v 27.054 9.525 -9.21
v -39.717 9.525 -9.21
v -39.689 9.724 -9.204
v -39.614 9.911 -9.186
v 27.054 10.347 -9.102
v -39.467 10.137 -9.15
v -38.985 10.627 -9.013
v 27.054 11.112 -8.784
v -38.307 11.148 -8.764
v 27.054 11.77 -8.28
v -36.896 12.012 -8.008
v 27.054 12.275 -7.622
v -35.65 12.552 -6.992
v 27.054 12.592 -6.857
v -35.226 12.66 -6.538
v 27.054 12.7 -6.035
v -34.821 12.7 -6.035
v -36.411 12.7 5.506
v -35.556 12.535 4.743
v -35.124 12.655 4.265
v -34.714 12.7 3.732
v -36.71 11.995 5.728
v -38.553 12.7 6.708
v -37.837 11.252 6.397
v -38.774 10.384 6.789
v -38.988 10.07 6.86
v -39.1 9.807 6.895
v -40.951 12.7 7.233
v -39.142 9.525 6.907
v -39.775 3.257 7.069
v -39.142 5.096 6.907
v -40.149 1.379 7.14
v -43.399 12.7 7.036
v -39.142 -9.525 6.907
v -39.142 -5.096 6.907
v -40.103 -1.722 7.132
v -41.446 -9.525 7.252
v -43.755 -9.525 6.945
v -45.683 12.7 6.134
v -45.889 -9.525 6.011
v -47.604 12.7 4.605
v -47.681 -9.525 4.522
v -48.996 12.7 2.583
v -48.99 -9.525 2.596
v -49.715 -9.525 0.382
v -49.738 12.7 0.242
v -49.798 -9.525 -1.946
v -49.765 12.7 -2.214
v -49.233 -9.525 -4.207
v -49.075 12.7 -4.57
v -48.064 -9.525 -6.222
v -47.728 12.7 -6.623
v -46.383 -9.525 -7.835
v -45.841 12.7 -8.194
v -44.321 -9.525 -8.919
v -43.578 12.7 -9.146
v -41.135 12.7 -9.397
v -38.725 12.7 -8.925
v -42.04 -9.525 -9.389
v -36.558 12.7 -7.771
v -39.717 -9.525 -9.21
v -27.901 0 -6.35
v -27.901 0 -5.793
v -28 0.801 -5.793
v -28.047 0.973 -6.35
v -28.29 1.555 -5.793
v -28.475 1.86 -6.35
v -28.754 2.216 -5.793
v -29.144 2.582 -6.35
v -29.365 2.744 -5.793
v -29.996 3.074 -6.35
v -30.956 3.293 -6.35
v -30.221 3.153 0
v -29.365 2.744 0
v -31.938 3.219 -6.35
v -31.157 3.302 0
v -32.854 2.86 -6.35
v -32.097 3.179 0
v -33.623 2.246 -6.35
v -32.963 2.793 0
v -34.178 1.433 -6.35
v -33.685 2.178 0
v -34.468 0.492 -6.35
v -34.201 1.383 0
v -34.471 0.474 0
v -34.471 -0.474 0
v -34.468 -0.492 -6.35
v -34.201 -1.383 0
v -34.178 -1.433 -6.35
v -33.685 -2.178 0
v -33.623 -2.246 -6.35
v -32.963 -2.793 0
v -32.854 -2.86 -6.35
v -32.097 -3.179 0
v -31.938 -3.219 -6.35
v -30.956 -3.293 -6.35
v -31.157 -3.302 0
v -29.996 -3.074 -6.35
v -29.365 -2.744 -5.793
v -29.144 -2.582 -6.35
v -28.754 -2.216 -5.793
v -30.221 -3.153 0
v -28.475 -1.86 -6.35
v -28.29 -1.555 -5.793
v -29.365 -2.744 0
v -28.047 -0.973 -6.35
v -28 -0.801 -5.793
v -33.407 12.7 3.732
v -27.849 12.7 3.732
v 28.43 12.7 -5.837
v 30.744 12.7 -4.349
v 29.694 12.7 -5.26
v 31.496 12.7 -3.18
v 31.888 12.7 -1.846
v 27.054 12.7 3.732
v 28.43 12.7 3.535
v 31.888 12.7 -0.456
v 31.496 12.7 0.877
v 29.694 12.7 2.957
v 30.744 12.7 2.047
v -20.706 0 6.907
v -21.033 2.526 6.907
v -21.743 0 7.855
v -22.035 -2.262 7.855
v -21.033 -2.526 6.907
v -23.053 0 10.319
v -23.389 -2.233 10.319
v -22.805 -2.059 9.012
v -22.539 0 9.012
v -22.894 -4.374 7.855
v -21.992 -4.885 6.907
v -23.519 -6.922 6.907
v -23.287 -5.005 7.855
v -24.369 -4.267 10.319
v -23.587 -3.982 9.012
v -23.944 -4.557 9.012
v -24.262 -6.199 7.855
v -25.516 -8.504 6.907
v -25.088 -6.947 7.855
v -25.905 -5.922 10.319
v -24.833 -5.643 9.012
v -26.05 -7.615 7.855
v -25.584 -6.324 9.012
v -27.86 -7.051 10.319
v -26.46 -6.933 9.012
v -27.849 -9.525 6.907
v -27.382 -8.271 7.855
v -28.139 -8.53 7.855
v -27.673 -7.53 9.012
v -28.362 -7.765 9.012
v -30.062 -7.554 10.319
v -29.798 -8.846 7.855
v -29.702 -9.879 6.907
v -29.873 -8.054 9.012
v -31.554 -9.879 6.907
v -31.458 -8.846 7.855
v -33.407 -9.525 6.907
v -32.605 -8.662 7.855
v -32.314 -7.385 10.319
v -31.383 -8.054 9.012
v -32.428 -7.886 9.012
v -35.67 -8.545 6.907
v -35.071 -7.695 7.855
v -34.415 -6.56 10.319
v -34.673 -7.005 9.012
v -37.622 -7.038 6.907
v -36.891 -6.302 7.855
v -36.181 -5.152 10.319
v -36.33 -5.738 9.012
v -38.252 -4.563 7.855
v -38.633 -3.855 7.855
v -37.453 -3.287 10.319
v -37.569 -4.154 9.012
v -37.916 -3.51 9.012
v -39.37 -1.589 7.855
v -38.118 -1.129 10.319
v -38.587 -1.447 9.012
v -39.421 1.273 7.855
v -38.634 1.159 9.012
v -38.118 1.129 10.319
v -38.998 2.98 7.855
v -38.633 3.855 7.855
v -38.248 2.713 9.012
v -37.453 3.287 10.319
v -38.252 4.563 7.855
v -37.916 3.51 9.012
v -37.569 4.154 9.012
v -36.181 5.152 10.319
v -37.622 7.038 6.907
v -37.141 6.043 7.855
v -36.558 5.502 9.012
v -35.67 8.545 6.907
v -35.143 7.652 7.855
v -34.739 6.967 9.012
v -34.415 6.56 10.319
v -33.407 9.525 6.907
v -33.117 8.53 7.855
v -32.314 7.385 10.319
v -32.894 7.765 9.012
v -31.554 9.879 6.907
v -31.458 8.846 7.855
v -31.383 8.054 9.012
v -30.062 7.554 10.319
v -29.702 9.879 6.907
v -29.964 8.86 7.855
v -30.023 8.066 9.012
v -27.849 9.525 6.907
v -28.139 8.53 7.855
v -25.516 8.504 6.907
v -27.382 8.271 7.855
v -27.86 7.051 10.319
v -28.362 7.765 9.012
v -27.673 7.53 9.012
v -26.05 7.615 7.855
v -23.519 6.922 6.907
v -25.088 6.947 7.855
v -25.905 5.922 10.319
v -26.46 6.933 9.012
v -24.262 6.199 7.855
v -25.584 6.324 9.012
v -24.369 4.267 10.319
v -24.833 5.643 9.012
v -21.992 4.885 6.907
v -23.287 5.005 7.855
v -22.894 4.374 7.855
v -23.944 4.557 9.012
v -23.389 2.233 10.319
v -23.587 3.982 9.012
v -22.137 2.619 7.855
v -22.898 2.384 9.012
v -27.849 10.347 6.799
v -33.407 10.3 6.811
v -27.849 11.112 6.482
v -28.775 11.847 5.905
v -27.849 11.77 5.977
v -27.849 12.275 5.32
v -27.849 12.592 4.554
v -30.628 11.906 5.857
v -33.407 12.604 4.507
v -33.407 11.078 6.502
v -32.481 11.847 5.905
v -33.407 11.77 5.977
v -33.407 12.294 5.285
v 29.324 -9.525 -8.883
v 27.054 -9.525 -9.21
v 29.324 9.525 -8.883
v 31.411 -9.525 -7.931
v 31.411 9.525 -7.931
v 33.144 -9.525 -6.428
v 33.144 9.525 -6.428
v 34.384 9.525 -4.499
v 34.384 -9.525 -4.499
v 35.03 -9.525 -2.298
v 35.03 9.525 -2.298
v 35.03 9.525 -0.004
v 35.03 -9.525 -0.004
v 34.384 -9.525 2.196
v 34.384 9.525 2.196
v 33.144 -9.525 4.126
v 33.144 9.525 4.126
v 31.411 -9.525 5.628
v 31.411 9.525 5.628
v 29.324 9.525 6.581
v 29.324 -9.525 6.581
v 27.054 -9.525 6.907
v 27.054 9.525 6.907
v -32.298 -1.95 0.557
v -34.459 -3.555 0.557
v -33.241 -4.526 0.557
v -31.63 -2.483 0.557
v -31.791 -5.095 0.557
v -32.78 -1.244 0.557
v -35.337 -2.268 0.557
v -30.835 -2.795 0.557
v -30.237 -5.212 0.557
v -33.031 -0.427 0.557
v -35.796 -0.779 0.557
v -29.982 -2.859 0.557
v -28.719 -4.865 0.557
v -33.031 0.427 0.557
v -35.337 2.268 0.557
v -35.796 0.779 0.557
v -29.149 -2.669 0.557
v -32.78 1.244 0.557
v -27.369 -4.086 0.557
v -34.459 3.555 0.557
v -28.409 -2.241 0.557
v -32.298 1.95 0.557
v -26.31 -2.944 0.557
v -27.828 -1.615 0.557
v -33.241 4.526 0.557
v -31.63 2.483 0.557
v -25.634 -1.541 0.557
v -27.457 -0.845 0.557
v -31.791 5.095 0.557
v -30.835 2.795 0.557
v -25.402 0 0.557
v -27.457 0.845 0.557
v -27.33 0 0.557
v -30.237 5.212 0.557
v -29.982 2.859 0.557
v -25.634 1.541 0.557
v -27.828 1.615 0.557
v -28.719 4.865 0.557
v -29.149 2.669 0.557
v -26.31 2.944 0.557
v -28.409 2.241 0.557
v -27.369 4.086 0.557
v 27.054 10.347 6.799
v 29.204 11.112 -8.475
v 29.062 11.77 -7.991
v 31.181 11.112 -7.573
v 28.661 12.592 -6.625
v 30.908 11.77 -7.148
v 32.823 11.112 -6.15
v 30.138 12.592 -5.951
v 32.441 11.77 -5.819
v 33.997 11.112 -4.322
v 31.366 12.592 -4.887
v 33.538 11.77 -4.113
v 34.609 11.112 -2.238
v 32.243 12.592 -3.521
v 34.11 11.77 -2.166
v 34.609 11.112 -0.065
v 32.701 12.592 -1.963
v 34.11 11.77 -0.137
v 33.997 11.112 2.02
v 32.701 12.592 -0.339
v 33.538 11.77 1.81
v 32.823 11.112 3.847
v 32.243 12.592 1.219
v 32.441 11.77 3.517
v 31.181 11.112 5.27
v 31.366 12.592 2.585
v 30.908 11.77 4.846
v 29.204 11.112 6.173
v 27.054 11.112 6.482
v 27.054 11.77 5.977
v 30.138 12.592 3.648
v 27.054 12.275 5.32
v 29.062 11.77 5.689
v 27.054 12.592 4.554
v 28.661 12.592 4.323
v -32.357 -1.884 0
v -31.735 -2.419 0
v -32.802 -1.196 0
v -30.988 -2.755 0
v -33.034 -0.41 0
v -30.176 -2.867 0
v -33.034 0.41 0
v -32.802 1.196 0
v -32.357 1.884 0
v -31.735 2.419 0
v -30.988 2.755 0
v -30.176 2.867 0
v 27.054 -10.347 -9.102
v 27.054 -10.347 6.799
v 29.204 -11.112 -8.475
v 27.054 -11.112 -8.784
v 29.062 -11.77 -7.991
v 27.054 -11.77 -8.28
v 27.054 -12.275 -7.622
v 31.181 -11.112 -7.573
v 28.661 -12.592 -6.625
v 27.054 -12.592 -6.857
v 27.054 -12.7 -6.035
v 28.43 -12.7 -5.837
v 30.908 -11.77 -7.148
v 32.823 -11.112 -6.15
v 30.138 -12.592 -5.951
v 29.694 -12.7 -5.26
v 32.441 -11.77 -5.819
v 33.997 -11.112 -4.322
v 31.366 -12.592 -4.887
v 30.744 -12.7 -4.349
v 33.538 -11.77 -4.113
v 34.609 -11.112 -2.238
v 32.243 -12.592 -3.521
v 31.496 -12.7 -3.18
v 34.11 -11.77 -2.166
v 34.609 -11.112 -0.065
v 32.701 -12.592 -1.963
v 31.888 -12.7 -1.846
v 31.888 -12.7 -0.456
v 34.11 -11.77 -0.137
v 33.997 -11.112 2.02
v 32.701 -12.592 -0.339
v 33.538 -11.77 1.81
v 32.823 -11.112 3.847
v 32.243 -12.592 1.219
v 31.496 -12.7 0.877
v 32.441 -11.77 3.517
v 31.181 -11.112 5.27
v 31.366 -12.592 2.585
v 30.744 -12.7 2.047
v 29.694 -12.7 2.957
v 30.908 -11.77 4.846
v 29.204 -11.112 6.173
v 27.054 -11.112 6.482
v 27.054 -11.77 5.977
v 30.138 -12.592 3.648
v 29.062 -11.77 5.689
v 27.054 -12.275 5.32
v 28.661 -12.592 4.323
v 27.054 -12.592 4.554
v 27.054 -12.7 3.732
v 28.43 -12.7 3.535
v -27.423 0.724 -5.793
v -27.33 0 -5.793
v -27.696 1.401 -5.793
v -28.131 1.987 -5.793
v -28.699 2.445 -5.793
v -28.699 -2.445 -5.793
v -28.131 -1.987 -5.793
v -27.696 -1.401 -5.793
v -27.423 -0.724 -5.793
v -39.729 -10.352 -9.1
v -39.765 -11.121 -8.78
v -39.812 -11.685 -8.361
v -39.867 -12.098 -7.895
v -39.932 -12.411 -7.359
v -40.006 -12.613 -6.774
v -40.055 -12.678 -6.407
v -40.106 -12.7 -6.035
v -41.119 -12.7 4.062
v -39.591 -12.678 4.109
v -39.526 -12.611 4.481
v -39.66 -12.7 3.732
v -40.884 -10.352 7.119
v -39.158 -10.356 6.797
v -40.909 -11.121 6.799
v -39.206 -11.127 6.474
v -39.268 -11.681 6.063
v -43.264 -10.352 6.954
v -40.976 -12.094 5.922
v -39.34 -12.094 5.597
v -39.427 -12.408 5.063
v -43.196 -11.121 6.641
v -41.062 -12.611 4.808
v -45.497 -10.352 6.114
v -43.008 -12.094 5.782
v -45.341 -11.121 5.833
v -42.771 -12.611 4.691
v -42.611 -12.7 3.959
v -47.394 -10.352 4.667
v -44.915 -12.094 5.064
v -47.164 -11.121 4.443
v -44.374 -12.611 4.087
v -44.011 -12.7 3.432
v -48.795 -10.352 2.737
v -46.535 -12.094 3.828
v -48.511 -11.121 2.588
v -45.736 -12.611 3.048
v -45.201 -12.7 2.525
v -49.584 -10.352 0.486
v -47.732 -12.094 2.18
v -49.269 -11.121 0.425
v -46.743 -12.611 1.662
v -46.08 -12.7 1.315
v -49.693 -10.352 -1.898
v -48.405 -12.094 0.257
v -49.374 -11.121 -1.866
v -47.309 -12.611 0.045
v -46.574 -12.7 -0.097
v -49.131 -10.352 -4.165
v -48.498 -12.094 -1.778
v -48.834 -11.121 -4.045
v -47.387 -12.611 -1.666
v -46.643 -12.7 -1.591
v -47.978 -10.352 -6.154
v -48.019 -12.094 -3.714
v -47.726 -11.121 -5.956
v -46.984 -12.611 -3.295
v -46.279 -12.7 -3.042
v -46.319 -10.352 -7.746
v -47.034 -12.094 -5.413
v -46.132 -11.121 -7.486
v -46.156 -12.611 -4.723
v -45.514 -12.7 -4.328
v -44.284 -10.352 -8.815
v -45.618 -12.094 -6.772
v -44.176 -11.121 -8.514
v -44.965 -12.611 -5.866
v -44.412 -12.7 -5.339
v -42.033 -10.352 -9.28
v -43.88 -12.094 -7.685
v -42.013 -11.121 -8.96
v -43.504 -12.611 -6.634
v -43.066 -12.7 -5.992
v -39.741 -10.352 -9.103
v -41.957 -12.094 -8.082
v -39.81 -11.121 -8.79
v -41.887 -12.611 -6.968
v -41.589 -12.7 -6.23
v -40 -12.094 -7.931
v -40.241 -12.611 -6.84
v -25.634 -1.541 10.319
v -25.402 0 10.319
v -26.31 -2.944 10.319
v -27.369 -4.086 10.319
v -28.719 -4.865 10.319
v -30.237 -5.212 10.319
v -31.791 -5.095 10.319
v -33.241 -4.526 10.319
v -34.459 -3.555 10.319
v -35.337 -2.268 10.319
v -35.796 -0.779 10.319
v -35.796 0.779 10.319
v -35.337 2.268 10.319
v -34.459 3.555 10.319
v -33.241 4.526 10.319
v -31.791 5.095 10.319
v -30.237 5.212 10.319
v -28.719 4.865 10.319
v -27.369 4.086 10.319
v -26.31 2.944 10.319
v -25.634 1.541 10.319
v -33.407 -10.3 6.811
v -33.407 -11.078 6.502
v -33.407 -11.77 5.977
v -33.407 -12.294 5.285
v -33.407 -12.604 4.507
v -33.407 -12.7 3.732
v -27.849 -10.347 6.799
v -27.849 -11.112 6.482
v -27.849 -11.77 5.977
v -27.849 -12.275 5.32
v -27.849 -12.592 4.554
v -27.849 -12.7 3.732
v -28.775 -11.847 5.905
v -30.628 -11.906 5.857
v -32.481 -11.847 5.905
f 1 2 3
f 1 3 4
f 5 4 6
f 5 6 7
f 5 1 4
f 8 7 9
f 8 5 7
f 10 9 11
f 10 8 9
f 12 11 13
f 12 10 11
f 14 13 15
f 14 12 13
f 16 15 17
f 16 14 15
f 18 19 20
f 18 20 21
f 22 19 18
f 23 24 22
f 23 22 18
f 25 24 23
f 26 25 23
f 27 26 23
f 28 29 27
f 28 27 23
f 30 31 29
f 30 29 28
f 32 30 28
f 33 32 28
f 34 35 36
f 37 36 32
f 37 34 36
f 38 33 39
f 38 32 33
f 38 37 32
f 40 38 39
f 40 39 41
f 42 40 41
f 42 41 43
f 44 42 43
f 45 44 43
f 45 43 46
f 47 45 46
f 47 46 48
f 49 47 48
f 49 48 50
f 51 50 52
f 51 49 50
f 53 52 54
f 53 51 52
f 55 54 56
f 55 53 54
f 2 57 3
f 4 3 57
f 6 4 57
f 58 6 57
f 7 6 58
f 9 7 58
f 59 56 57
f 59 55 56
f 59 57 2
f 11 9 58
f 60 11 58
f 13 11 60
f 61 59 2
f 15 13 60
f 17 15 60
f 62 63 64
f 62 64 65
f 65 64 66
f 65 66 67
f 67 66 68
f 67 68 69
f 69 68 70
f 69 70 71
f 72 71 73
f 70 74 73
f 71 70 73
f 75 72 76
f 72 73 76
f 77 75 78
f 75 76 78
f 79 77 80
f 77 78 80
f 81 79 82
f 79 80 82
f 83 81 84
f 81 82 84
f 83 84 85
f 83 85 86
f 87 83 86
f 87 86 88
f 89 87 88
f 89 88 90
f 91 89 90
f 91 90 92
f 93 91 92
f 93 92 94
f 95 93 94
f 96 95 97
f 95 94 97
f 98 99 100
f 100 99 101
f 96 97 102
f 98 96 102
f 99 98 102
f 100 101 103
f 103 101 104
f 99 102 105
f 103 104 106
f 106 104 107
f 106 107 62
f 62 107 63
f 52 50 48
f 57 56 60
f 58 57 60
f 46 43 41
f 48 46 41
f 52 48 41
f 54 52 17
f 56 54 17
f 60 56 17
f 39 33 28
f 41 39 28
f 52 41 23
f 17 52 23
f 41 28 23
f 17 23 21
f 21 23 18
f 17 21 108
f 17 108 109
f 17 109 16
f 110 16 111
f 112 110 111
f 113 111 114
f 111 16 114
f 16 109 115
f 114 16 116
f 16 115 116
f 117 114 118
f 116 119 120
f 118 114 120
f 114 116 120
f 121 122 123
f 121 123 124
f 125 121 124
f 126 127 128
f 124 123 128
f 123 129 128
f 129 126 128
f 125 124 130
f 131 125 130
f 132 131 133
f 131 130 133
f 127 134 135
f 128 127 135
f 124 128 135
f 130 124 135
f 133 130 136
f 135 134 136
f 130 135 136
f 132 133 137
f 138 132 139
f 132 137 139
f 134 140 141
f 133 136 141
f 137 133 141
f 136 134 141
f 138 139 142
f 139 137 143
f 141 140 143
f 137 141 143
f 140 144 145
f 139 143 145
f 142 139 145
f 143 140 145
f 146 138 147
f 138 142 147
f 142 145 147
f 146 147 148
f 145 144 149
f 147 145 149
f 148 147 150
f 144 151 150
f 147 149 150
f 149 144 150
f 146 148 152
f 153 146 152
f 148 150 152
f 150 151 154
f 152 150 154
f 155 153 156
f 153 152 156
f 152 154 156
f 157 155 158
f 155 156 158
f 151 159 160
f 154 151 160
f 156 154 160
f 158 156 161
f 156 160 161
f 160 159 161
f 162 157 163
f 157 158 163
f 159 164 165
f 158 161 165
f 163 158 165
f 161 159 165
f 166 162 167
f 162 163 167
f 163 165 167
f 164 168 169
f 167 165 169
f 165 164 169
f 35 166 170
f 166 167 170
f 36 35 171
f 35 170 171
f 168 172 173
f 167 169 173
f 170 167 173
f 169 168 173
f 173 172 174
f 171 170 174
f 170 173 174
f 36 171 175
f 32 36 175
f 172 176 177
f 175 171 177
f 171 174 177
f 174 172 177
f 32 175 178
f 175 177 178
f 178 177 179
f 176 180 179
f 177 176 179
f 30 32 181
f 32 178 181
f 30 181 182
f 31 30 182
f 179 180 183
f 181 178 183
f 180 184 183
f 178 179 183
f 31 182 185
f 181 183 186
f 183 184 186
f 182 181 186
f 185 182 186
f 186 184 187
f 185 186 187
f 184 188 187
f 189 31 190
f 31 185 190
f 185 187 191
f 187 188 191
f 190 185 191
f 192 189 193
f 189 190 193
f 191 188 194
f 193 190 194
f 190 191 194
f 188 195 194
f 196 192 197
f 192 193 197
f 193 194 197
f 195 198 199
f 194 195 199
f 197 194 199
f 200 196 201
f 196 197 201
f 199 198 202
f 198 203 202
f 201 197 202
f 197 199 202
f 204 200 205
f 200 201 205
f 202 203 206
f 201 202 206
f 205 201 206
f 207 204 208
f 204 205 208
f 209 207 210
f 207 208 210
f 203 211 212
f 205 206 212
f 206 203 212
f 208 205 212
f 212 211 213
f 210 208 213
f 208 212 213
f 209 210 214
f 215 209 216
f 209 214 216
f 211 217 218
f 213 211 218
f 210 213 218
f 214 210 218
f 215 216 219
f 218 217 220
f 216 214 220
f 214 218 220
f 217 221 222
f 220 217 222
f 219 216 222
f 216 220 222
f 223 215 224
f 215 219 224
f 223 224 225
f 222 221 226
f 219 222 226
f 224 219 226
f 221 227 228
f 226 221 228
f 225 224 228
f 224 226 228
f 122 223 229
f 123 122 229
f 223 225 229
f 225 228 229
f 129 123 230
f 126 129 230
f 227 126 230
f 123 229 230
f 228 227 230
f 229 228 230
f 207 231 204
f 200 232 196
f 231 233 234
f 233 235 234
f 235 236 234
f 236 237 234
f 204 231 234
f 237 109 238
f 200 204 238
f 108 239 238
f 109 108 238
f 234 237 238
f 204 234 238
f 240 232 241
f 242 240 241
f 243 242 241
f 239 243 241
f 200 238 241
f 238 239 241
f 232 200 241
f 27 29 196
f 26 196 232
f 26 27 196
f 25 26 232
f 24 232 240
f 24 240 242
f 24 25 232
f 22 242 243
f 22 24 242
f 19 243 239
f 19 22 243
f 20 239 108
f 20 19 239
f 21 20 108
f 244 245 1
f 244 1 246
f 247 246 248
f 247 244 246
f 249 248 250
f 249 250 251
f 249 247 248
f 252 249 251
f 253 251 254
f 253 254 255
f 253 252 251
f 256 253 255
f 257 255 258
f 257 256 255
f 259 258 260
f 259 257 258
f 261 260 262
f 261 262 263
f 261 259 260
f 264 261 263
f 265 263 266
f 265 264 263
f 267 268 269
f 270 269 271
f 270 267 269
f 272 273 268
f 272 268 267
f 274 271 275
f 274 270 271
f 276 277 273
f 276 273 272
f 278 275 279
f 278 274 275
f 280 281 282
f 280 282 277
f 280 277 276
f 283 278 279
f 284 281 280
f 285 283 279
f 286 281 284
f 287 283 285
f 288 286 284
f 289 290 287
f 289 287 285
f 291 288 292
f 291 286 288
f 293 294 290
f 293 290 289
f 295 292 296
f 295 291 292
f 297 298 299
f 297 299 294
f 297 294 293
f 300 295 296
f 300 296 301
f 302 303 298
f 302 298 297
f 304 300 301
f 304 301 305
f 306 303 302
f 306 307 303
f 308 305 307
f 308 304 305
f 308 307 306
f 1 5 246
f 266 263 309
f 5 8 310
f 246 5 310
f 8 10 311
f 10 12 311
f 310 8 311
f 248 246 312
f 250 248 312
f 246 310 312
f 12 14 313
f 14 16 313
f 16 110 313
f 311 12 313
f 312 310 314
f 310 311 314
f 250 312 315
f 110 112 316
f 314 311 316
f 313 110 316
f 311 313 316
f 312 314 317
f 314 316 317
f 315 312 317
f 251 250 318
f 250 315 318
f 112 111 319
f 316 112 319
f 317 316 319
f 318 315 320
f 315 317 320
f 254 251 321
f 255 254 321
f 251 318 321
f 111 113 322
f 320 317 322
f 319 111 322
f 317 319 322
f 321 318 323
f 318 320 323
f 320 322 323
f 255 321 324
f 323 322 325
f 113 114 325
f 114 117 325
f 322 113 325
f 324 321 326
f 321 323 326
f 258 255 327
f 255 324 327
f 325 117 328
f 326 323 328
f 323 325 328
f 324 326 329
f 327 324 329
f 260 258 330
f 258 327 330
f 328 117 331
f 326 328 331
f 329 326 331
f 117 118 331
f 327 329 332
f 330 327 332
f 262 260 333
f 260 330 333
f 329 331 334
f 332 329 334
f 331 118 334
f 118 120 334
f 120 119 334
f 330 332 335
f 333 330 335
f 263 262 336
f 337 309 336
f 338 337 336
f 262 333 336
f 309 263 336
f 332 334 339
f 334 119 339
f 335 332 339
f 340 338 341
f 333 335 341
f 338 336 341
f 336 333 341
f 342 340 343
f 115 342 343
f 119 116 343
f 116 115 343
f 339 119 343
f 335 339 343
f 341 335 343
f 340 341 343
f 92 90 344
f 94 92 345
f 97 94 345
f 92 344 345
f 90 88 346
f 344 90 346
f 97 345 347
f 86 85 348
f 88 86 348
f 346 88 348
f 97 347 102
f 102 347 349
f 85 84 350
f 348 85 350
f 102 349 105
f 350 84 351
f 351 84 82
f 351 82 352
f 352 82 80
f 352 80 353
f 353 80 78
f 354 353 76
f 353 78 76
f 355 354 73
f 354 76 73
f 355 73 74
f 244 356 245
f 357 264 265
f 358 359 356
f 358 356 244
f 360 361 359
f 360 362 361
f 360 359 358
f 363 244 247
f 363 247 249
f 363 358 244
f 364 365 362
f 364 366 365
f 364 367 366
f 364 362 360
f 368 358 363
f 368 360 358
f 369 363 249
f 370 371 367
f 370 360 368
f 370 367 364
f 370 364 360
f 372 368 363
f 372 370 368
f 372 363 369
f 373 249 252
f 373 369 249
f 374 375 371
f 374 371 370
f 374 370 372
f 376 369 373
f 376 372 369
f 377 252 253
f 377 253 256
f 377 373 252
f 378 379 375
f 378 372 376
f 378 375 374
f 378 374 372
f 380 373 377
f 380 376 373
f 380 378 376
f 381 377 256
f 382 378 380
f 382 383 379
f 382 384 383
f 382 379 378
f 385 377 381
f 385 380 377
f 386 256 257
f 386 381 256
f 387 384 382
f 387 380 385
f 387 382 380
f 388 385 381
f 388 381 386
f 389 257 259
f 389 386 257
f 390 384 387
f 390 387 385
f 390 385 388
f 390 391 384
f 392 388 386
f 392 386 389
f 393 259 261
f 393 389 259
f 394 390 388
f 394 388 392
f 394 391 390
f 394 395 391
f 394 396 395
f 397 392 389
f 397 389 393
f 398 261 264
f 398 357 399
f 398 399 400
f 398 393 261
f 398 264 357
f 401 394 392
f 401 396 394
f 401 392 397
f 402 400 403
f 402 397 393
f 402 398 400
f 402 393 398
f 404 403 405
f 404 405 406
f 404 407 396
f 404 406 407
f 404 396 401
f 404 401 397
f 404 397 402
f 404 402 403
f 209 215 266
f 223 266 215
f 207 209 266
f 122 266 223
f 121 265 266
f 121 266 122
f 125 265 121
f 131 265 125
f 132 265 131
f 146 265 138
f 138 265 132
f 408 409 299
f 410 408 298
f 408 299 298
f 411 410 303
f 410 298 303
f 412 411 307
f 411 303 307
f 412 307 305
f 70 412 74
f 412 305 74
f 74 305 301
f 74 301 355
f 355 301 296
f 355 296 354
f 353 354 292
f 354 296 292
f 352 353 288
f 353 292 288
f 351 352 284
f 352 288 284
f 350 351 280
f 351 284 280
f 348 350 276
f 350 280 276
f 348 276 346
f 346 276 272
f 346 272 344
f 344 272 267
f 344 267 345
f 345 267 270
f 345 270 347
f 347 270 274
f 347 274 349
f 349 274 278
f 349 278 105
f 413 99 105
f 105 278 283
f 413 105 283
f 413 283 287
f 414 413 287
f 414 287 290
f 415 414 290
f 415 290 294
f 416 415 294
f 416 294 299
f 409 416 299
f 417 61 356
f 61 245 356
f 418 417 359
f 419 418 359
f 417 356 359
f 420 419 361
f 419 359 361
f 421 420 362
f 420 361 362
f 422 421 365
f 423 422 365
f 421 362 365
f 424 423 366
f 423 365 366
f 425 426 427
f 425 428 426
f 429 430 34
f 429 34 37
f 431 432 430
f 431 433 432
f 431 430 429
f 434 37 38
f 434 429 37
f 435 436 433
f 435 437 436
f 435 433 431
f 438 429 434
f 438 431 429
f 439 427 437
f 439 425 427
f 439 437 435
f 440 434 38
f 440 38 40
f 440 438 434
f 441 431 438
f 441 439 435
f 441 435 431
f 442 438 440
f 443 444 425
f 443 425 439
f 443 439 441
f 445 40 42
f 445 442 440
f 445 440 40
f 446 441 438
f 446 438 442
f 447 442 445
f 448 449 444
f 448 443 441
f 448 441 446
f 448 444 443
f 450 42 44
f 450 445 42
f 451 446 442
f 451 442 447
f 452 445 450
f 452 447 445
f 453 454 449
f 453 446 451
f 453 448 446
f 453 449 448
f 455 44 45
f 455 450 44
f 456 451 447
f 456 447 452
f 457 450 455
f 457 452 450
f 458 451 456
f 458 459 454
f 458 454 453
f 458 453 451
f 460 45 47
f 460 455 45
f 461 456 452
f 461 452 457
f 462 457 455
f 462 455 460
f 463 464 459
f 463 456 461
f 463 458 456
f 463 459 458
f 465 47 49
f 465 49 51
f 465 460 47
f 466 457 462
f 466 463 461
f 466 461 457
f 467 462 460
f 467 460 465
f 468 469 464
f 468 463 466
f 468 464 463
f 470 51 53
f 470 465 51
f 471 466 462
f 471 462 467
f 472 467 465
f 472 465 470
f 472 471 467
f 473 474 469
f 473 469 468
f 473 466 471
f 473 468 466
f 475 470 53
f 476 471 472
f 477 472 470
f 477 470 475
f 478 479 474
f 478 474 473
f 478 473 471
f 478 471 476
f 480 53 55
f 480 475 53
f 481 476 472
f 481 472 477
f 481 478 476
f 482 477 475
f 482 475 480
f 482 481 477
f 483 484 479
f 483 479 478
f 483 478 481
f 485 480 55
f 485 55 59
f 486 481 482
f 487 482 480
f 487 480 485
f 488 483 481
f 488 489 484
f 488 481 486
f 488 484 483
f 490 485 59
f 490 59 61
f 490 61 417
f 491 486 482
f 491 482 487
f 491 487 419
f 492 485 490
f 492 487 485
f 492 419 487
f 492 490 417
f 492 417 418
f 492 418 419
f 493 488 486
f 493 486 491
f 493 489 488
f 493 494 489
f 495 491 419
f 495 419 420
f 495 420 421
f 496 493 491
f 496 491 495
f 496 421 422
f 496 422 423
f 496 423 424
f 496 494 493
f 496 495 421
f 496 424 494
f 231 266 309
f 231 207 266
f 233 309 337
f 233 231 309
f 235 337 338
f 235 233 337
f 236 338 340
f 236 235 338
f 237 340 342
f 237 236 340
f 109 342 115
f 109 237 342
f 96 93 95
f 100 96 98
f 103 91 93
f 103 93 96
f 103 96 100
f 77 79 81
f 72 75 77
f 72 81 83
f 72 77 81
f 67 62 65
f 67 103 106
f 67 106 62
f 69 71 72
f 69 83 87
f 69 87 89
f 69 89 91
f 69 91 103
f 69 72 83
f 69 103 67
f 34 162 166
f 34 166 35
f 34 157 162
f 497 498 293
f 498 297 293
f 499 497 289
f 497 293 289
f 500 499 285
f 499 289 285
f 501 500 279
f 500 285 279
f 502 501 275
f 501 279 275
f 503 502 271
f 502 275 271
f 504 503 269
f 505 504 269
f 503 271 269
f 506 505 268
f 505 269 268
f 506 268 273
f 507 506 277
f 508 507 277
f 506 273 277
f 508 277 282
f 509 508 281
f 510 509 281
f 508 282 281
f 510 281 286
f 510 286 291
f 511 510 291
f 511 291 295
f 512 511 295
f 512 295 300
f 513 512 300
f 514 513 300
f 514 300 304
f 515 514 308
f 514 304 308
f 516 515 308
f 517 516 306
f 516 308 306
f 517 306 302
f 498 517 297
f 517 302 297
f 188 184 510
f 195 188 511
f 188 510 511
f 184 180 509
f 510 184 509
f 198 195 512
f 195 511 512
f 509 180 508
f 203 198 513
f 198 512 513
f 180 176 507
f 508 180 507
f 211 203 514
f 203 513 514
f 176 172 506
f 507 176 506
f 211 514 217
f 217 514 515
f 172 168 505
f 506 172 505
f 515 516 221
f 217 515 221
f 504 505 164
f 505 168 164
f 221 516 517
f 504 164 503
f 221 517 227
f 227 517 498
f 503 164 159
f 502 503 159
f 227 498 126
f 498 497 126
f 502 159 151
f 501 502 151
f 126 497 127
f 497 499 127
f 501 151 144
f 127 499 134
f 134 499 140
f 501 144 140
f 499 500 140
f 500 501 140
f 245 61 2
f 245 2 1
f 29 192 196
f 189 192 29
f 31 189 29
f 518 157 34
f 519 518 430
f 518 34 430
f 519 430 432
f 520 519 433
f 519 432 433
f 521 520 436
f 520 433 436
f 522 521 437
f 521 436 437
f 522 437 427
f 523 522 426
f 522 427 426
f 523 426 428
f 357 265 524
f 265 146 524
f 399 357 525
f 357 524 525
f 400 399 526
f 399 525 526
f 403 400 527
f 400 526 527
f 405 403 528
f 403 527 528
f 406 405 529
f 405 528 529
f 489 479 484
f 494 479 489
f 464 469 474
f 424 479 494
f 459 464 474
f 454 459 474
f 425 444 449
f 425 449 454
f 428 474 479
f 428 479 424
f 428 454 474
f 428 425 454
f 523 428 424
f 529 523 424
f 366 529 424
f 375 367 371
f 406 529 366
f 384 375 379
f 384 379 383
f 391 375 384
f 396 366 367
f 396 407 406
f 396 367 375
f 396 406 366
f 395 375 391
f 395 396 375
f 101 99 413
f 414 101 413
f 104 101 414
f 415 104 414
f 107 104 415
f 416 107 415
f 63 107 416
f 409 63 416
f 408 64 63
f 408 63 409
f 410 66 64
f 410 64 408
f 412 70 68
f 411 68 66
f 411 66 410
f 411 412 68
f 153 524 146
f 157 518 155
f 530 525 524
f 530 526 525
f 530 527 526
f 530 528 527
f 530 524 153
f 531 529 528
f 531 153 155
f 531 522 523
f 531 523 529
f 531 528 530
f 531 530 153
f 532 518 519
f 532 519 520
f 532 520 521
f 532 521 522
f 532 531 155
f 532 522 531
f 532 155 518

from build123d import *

# Parameters (mm, degrees)
F1_DEPTH  = 12.7
F5_R      = 3.302
F4_FACE_R = 5.2264022723
F6_DEPTH  = 6.35
F7_DEPTH  = 6.35
F8_DEPTH  = 6.35
F9_R      = 2.8667617308
F10_DEPTH = 6.35
F11_R     = 3.175


with BuildPart() as f1:
    # F0 (on Front) → F1 (new body, symmetric)
    with BuildSketch(Plane.XZ):
        with BuildLine():
            Line((27.0537398756, 6.9073382765), (-39.1415841877, 6.9073382765))
            ThreePointArc((-39.1415841877, 6.9073382765), (-49.8380616626, -0.7794862001), (-39.7171936929, -9.2097846791))
            Line((-39.7171936929, -9.2097846791), (27.0537398756, -9.2097846791))
            ThreePointArc((27.0537398756, -9.2097846791), (35.1123013534, -1.1512232013), (27.0537398756, 6.9073382765))
        make_face()
    extrude(amount=F1_DEPTH, both=True)

    # F3 (on Front) → F4 (revolve)
    with BuildSketch(Plane.XZ):
        with BuildLine():
            ThreePointArc((-19.0515599295, 6.0564640567), (-21.5885566512, 7.6841524566), (-23.0529304126, 10.3187931113))
            Line((-23.0529304126, 10.3187931113), (-25.4015599295, 10.3187931113))
            Line((-25.4015599295, 10.3187931113), (-25.4015599295, 6.0564640567))
            Line((-25.4015599295, 6.0564640567), (-19.0515599295, 6.0564640567))
        make_face()
    revolve(axis=Axis((-30.6279622018, 0, 0.5539879203), (0, 0, -1)))

    # F5 (on Top) + F4_face (on face) → F6 (cut)
    with BuildSketch(Plane.XY):
        with Locations((-31.2027800828, 0)):
            Circle(F5_R)
    with BuildSketch(Plane(origin=(-30.6279622018, 0, 6.9073382765), x_dir=(1, 0, 0), z_dir=(0, 0, 1))):
        Circle(F4_FACE_R)
    extrude(amount=-F6_DEPTH, mode=Mode.SUBTRACT)

    # F5 (on Top) → F7 (cut)
    with BuildSketch(Plane.XY):
        with Locations((-31.2027800828, 0)):
            Circle(F5_R)
    extrude(amount=-F7_DEPTH, mode=Mode.SUBTRACT)

    # F5 (on Top) → F8 (cut)
    with BuildSketch(Plane.XY):
        with Locations((-31.2027800828, 0)):
            Circle(F5_R)
    extrude(amount=-F8_DEPTH, mode=Mode.SUBTRACT)

    # F9 (on face) → F10 (cut)
    with BuildSketch(Plane.XY.offset(0.5573382765)):
        with Locations((-30.1966872066, 0)):
            Circle(F9_R)
    extrude(amount=-F10_DEPTH, mode=Mode.SUBTRACT)

    # F11
    f11_edges = [f1.edges().sort_by_distance(p)[0] for p in [
        (-6.043922, -12.7, 6.907338),
        (-6.043922, 12.7, 6.907338),
        (-49.838062, -12.7, -0.779486),
    ]]
    fillet(f11_edges, radius=F11_R)


solid = f1.part
